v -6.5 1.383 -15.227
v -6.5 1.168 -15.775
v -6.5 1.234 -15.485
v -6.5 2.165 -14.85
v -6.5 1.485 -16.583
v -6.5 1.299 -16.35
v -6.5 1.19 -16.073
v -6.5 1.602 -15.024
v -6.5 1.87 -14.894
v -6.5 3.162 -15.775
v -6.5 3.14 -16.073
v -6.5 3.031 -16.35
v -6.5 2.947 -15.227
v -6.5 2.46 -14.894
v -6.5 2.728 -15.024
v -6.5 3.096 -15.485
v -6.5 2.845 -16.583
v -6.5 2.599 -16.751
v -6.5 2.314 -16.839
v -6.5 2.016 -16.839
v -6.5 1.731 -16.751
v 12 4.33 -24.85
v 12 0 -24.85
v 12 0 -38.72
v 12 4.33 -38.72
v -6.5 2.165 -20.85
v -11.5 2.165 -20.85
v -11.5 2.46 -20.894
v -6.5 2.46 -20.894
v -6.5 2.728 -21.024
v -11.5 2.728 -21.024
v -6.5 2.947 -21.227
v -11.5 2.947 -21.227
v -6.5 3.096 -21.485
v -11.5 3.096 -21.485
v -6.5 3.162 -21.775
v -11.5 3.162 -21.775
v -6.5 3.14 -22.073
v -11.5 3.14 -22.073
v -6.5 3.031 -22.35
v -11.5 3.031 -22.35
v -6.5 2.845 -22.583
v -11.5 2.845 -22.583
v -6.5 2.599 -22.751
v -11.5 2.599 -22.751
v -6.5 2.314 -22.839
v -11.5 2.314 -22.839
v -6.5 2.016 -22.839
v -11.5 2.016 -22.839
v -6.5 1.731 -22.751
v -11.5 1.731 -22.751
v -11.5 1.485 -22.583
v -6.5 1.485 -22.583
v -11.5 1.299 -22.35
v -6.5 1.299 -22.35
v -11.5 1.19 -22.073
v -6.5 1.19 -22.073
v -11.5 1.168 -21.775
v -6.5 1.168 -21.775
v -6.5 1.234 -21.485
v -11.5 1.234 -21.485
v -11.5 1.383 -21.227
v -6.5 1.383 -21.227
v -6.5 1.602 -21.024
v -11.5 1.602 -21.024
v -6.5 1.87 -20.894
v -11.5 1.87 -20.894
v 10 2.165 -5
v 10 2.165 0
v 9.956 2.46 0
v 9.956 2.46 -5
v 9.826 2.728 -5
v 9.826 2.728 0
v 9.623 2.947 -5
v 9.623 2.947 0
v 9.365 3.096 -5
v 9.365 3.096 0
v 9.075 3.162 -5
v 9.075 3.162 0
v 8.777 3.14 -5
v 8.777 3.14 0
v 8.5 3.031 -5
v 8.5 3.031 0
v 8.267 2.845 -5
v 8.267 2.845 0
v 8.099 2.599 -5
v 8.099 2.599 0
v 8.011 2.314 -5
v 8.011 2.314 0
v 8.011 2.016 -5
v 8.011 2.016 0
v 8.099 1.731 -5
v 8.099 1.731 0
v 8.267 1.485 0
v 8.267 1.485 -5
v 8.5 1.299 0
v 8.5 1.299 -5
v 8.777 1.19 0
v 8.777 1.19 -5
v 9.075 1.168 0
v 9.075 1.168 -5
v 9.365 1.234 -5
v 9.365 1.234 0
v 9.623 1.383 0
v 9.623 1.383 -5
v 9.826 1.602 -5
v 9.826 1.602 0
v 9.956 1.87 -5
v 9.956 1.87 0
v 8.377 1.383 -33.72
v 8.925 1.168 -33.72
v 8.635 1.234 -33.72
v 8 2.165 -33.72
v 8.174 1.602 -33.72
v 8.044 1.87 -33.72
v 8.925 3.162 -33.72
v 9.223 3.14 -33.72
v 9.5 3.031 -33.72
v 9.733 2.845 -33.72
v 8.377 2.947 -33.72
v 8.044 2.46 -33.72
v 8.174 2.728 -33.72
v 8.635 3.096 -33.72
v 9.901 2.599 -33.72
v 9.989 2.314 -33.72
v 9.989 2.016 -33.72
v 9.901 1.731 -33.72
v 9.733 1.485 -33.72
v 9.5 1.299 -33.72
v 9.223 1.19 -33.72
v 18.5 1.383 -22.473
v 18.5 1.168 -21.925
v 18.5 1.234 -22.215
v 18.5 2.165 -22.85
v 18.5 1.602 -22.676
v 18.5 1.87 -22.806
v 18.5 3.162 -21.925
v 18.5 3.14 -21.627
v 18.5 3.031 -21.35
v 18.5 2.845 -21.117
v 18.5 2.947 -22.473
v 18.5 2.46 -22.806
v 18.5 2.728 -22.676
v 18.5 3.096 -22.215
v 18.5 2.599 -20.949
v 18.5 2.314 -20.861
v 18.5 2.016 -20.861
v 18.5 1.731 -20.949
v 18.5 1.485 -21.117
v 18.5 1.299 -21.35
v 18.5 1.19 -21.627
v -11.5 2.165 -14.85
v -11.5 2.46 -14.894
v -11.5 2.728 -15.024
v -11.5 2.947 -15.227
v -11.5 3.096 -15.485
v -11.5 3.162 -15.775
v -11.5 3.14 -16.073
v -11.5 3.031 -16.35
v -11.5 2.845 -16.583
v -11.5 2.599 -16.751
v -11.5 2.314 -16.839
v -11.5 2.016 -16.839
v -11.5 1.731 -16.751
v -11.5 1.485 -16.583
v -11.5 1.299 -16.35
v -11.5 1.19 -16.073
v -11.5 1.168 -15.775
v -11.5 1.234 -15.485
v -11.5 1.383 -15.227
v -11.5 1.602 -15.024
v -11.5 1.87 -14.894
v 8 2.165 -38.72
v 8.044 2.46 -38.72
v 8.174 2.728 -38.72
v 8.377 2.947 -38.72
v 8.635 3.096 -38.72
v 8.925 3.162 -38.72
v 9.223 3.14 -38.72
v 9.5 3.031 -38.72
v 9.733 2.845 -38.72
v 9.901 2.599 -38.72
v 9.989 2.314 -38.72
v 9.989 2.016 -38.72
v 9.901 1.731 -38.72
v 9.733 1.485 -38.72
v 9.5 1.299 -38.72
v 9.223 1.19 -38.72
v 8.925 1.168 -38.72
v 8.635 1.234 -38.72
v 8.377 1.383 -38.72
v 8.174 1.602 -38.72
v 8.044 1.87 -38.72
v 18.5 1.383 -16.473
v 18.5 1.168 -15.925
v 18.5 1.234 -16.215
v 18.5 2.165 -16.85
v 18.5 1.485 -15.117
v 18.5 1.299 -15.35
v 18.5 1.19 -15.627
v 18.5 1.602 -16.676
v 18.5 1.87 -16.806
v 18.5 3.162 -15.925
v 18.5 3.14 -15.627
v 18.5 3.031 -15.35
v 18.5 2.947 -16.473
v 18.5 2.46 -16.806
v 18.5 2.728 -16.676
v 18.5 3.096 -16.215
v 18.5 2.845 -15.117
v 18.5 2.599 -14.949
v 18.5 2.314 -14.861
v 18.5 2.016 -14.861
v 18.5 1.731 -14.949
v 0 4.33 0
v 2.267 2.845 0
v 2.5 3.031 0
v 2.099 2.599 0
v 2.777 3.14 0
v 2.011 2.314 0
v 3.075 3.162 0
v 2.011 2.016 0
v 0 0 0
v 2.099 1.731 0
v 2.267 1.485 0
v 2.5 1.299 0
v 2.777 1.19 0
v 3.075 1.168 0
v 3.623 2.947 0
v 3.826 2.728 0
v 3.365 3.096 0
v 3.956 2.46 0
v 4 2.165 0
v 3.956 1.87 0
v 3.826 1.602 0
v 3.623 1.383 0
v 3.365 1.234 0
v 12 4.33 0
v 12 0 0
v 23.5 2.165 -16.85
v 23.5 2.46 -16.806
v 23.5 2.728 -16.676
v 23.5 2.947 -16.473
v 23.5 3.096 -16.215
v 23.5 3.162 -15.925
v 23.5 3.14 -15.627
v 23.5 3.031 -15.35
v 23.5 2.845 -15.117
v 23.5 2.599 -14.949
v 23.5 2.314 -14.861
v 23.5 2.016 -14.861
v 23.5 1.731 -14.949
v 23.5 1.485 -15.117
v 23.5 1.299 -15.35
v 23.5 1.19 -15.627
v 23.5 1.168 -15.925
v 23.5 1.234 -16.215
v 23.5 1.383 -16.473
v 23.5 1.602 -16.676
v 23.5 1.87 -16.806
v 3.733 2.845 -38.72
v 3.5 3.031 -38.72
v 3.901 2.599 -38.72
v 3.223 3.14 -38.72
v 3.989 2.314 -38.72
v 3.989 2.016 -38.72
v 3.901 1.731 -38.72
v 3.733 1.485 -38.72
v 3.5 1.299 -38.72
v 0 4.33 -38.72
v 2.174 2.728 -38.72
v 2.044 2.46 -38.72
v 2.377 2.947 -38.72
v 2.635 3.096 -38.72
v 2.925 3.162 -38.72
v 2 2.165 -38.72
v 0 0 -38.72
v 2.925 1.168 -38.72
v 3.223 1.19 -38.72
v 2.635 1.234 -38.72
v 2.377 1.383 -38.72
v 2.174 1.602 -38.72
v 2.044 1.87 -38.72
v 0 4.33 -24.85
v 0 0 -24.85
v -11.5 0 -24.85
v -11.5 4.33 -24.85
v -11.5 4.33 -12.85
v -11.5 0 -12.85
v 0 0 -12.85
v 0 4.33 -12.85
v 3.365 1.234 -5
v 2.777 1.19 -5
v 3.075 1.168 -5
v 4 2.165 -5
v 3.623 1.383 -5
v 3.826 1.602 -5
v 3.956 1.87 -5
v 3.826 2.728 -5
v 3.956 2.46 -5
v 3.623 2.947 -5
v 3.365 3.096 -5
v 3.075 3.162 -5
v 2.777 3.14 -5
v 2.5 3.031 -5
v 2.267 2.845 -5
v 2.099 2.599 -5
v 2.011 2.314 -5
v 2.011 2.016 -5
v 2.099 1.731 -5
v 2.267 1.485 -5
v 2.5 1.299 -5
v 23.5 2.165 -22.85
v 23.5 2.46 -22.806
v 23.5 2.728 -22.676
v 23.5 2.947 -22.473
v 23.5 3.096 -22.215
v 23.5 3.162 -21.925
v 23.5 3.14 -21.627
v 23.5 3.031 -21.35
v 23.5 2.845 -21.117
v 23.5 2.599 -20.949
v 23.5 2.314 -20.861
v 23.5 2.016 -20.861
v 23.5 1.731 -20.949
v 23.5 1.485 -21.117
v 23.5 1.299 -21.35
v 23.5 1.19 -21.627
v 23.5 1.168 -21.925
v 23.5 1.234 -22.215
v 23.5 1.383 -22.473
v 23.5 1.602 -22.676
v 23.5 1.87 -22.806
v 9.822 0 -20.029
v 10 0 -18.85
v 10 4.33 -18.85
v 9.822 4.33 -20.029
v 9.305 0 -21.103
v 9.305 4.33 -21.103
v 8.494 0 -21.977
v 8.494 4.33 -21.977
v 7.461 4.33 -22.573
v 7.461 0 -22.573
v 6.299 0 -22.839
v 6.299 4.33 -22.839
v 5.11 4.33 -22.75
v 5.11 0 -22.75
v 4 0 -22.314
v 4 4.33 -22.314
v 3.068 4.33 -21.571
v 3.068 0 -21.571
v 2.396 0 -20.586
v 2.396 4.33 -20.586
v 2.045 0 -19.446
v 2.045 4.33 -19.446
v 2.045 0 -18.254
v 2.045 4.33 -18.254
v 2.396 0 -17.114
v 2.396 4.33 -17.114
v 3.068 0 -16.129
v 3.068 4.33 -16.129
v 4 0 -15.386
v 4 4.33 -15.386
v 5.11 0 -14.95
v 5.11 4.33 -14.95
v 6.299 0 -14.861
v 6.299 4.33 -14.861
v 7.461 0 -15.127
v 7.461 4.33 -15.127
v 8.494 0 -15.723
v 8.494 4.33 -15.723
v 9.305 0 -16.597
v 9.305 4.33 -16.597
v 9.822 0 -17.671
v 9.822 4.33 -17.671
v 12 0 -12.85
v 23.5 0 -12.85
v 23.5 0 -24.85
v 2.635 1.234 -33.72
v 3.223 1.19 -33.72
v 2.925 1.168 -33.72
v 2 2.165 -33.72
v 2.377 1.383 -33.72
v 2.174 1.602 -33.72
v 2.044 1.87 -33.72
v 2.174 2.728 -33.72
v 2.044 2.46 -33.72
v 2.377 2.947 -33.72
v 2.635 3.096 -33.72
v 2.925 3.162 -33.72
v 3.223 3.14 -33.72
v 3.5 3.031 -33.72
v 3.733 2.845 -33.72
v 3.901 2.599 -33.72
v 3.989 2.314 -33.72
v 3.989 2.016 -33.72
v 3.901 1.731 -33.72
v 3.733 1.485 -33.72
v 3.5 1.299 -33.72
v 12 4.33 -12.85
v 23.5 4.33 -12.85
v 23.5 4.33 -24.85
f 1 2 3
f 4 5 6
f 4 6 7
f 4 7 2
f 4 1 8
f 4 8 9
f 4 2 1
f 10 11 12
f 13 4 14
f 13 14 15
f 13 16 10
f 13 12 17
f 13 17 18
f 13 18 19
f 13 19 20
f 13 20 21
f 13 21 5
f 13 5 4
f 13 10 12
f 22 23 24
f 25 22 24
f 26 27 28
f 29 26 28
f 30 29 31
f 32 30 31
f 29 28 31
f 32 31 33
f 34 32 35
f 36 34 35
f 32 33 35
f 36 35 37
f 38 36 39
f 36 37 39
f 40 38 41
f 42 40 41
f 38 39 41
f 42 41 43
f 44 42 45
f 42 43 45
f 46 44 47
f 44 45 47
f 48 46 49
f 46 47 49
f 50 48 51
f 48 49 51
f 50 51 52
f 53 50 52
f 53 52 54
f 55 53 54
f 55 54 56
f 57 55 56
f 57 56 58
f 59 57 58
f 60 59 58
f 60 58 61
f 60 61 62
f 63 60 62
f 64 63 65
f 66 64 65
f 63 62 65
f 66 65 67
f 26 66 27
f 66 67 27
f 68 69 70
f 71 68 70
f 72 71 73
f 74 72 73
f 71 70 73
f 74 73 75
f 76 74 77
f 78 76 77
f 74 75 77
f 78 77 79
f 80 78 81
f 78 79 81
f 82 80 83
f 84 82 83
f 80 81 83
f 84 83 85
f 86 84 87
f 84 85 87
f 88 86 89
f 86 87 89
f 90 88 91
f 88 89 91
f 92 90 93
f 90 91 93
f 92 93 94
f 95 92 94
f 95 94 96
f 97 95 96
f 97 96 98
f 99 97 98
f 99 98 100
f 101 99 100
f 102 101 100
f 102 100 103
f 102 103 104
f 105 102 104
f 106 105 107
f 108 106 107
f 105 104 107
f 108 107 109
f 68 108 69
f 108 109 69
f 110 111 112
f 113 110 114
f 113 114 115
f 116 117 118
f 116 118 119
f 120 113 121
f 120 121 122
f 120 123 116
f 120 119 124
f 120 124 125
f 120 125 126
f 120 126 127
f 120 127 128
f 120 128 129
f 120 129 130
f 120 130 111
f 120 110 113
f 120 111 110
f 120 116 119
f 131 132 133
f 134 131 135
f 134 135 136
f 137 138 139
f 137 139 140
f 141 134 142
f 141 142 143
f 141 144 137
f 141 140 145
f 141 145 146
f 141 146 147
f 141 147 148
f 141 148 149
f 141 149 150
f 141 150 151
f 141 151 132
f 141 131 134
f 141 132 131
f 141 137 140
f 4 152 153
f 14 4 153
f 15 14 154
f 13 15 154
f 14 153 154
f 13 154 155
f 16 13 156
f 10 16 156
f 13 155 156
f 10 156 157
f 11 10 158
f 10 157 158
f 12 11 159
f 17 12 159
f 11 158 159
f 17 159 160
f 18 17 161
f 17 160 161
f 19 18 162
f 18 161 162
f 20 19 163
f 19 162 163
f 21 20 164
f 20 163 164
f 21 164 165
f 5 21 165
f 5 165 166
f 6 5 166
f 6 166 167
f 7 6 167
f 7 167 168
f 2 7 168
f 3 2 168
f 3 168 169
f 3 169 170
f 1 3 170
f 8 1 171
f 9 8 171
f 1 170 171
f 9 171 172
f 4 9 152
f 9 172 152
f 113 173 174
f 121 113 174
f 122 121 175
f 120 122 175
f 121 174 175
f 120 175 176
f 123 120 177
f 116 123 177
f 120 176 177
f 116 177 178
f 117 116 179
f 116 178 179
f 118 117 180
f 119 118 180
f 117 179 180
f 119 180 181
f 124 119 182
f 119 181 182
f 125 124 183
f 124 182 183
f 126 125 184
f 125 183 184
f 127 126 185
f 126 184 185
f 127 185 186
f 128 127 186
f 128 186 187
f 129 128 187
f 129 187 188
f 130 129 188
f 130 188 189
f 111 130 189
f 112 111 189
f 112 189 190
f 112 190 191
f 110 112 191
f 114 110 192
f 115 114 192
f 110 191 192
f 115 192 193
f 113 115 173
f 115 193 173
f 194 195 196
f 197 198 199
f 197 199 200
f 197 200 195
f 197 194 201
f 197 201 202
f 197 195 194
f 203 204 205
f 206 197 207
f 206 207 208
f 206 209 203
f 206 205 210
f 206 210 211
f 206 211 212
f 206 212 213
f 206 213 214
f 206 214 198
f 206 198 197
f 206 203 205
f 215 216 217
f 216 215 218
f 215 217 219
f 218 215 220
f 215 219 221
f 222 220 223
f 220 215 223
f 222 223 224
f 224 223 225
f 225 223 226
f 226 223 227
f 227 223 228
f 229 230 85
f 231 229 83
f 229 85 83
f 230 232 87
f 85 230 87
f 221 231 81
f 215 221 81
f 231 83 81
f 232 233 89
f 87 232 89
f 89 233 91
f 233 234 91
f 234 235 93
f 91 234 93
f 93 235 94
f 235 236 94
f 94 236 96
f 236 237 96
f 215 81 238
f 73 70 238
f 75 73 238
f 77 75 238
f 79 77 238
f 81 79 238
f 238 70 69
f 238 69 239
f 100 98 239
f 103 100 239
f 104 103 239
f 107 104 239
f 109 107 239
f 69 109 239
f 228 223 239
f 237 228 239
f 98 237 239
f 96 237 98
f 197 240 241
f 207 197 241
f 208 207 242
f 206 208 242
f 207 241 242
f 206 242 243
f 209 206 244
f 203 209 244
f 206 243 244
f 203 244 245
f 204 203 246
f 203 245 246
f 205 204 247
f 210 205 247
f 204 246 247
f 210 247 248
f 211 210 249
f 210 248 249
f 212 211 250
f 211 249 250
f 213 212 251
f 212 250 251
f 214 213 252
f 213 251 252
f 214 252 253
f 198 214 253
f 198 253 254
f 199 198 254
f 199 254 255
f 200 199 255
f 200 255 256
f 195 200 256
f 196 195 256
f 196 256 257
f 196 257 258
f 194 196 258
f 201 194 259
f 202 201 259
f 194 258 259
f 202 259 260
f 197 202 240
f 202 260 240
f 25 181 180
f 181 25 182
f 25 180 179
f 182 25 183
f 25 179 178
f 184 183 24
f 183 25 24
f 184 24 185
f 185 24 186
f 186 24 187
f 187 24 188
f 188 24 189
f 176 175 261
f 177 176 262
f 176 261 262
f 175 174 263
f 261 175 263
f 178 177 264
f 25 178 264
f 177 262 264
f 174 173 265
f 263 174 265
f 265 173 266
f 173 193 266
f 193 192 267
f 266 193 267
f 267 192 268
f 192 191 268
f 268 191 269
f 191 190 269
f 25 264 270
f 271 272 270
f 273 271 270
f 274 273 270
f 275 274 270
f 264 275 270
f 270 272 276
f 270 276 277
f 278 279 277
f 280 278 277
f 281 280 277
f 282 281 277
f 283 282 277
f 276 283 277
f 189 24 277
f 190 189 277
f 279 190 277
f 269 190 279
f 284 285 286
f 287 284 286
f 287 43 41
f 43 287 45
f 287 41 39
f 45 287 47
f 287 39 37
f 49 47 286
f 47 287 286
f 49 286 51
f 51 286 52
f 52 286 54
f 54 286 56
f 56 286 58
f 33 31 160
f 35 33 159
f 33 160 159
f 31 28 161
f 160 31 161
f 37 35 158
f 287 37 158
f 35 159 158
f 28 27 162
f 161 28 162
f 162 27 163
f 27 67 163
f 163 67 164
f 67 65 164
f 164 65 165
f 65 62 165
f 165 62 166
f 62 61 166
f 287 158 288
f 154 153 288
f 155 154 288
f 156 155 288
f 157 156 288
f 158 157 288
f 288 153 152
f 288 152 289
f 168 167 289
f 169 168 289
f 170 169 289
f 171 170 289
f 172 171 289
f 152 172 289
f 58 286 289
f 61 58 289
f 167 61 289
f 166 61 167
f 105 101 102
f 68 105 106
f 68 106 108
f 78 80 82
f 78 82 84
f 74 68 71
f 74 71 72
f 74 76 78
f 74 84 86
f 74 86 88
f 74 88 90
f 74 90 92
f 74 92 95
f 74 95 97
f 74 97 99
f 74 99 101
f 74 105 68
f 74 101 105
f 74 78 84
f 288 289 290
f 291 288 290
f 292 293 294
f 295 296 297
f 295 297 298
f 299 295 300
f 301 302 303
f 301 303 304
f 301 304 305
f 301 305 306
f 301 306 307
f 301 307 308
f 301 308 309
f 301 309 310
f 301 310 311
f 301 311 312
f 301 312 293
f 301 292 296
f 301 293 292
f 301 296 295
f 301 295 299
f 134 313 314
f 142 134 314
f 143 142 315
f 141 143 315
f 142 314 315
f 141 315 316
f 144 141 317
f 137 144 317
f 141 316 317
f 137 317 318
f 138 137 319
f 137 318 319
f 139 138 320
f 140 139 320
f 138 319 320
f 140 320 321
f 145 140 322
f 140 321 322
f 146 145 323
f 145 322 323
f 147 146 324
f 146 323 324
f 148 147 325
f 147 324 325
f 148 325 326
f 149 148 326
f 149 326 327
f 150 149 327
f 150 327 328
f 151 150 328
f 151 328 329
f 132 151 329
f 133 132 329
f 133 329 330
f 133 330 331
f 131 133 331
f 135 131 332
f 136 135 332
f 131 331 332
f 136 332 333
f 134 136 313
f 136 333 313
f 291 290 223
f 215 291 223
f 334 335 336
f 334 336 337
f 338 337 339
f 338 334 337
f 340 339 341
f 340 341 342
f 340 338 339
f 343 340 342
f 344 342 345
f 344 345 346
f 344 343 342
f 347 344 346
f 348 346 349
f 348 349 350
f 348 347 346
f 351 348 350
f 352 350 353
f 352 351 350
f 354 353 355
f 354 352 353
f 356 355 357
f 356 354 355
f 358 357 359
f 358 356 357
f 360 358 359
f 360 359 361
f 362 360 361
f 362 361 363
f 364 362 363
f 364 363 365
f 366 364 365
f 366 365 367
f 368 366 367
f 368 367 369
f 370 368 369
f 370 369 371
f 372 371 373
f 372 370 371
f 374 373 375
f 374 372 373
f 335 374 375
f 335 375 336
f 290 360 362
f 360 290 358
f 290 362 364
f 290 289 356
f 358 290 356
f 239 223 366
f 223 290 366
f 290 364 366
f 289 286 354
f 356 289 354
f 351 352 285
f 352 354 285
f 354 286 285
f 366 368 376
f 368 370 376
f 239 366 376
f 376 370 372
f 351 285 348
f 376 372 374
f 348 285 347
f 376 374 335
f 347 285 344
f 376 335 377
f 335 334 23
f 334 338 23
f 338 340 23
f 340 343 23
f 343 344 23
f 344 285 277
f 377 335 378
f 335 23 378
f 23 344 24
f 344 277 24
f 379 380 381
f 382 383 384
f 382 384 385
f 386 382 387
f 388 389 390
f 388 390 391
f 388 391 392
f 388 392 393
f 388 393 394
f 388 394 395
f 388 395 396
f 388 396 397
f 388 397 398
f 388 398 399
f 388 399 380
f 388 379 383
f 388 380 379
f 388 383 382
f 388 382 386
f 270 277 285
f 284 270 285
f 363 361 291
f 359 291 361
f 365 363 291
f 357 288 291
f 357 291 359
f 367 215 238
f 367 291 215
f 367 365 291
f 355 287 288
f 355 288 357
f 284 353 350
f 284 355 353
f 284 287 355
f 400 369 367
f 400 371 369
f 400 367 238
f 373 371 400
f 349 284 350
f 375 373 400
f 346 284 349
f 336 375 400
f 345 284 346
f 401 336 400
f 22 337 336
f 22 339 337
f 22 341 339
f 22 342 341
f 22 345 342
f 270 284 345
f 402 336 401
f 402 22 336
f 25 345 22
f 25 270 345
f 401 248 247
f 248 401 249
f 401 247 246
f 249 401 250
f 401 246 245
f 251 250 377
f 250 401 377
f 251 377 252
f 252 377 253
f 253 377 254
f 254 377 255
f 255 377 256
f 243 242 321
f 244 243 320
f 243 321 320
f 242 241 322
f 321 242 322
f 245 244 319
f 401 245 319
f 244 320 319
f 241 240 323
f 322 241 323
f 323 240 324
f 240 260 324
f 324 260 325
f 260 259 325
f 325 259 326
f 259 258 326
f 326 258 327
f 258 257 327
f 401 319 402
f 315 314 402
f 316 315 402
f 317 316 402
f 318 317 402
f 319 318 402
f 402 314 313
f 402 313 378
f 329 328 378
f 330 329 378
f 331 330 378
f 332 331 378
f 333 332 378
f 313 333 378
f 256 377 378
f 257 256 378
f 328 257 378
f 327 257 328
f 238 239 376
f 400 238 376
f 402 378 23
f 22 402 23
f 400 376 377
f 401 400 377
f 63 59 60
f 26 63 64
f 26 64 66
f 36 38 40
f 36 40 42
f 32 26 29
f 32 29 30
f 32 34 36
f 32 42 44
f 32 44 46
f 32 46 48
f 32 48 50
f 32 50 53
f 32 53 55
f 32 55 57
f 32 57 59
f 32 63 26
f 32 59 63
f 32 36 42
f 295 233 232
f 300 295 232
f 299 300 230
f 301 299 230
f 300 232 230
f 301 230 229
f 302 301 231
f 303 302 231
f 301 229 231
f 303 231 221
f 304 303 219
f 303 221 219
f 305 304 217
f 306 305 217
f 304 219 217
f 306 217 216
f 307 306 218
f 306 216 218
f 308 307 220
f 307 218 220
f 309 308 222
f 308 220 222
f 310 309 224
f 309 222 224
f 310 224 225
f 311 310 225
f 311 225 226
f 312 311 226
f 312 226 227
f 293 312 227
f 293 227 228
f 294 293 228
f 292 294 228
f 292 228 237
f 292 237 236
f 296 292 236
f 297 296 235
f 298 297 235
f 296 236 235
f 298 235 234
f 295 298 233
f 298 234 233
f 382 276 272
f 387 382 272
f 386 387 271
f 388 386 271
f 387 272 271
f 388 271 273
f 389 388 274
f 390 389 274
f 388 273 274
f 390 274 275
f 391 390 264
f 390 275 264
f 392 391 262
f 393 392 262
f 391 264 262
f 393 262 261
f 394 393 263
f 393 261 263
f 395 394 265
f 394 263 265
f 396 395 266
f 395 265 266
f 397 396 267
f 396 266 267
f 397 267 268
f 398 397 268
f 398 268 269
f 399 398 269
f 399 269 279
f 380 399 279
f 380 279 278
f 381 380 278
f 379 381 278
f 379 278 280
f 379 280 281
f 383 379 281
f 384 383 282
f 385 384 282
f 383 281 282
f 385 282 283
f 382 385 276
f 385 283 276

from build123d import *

# Parameters (mm, degrees)
SKETCH2_R           = 4
BOSS_EXTRUDE1_DEPTH = 4.33
SKETCH3_R           = 1
CUT_EXTRUDE1_DEPTH  = 5
SKETCH4_R           = 1
CUT_EXTRUDE2_DEPTH  = 5
SKETCH5_R           = 1
CUT_EXTRUDE3_DEPTH  = 5
SKETCH6_R           = 1
CUT_EXTRUDE4_DEPTH  = 5


with BuildPart() as part:
    # Sketch2 → Boss-Extrude1 (new body)
    with BuildSketch(Plane(origin=(0, 0, 0), x_dir=(1, 0, 0), z_dir=(0, 1, 0))):
        Polygon((0, 0), (12, 0), (12, 12.85), (23.5, 12.85), (23.5, 24.85), (12, 24.85), (12, 38.72), (0, 38.72), (0, 24.85), (-11.5, 24.85), (-11.5, 12.85), (0, 12.85), align=None)
        with Locations((6, 18.85)):
            Circle(SKETCH2_R, mode=Mode.SUBTRACT)
    extrude(amount=BOSS_EXTRUDE1_DEPTH)

    # Sketch3 → Cut-Extrude1 (cut)
    with BuildSketch(Plane.XY):
        with Locations((3, 2.165)):
            Circle(SKETCH3_R)
        with Locations((9, 2.165)):
            Circle(SKETCH3_R)
    extrude(amount=-CUT_EXTRUDE1_DEPTH, mode=Mode.SUBTRACT)

    # Sketch4 → Cut-Extrude2 (cut)
    with BuildSketch(Plane.ZY.offset(11.5)):
        with Locations((-21.85, 2.165)):
            Circle(SKETCH4_R)
        with Locations((-15.85, 2.165)):
            Circle(SKETCH4_R)
    extrude(amount=-CUT_EXTRUDE2_DEPTH, mode=Mode.SUBTRACT)

    # Sketch5 → Cut-Extrude3 (cut)
    with BuildSketch(Plane(origin=(0, 0, -38.72), x_dir=(-1, 0, 0), z_dir=(0, 0, -1))):
        with Locations((-9, 2.165)):
            Circle(SKETCH5_R)
        with Locations((-3, 2.165)):
            Circle(SKETCH5_R)
    extrude(amount=-CUT_EXTRUDE3_DEPTH, mode=Mode.SUBTRACT)

    # Sketch6 → Cut-Extrude4 (cut)
    with BuildSketch(Plane(origin=(23.5, 0, 0), x_dir=(0, 0, -1), z_dir=(1, 0, 0))):
        with Locations((15.85, 2.165)):
            Circle(SKETCH6_R)
        with Locations((21.85, 2.165)):
            Circle(SKETCH6_R)
    extrude(amount=-CUT_EXTRUDE4_DEPTH, mode=Mode.SUBTRACT)


solid = part.part
